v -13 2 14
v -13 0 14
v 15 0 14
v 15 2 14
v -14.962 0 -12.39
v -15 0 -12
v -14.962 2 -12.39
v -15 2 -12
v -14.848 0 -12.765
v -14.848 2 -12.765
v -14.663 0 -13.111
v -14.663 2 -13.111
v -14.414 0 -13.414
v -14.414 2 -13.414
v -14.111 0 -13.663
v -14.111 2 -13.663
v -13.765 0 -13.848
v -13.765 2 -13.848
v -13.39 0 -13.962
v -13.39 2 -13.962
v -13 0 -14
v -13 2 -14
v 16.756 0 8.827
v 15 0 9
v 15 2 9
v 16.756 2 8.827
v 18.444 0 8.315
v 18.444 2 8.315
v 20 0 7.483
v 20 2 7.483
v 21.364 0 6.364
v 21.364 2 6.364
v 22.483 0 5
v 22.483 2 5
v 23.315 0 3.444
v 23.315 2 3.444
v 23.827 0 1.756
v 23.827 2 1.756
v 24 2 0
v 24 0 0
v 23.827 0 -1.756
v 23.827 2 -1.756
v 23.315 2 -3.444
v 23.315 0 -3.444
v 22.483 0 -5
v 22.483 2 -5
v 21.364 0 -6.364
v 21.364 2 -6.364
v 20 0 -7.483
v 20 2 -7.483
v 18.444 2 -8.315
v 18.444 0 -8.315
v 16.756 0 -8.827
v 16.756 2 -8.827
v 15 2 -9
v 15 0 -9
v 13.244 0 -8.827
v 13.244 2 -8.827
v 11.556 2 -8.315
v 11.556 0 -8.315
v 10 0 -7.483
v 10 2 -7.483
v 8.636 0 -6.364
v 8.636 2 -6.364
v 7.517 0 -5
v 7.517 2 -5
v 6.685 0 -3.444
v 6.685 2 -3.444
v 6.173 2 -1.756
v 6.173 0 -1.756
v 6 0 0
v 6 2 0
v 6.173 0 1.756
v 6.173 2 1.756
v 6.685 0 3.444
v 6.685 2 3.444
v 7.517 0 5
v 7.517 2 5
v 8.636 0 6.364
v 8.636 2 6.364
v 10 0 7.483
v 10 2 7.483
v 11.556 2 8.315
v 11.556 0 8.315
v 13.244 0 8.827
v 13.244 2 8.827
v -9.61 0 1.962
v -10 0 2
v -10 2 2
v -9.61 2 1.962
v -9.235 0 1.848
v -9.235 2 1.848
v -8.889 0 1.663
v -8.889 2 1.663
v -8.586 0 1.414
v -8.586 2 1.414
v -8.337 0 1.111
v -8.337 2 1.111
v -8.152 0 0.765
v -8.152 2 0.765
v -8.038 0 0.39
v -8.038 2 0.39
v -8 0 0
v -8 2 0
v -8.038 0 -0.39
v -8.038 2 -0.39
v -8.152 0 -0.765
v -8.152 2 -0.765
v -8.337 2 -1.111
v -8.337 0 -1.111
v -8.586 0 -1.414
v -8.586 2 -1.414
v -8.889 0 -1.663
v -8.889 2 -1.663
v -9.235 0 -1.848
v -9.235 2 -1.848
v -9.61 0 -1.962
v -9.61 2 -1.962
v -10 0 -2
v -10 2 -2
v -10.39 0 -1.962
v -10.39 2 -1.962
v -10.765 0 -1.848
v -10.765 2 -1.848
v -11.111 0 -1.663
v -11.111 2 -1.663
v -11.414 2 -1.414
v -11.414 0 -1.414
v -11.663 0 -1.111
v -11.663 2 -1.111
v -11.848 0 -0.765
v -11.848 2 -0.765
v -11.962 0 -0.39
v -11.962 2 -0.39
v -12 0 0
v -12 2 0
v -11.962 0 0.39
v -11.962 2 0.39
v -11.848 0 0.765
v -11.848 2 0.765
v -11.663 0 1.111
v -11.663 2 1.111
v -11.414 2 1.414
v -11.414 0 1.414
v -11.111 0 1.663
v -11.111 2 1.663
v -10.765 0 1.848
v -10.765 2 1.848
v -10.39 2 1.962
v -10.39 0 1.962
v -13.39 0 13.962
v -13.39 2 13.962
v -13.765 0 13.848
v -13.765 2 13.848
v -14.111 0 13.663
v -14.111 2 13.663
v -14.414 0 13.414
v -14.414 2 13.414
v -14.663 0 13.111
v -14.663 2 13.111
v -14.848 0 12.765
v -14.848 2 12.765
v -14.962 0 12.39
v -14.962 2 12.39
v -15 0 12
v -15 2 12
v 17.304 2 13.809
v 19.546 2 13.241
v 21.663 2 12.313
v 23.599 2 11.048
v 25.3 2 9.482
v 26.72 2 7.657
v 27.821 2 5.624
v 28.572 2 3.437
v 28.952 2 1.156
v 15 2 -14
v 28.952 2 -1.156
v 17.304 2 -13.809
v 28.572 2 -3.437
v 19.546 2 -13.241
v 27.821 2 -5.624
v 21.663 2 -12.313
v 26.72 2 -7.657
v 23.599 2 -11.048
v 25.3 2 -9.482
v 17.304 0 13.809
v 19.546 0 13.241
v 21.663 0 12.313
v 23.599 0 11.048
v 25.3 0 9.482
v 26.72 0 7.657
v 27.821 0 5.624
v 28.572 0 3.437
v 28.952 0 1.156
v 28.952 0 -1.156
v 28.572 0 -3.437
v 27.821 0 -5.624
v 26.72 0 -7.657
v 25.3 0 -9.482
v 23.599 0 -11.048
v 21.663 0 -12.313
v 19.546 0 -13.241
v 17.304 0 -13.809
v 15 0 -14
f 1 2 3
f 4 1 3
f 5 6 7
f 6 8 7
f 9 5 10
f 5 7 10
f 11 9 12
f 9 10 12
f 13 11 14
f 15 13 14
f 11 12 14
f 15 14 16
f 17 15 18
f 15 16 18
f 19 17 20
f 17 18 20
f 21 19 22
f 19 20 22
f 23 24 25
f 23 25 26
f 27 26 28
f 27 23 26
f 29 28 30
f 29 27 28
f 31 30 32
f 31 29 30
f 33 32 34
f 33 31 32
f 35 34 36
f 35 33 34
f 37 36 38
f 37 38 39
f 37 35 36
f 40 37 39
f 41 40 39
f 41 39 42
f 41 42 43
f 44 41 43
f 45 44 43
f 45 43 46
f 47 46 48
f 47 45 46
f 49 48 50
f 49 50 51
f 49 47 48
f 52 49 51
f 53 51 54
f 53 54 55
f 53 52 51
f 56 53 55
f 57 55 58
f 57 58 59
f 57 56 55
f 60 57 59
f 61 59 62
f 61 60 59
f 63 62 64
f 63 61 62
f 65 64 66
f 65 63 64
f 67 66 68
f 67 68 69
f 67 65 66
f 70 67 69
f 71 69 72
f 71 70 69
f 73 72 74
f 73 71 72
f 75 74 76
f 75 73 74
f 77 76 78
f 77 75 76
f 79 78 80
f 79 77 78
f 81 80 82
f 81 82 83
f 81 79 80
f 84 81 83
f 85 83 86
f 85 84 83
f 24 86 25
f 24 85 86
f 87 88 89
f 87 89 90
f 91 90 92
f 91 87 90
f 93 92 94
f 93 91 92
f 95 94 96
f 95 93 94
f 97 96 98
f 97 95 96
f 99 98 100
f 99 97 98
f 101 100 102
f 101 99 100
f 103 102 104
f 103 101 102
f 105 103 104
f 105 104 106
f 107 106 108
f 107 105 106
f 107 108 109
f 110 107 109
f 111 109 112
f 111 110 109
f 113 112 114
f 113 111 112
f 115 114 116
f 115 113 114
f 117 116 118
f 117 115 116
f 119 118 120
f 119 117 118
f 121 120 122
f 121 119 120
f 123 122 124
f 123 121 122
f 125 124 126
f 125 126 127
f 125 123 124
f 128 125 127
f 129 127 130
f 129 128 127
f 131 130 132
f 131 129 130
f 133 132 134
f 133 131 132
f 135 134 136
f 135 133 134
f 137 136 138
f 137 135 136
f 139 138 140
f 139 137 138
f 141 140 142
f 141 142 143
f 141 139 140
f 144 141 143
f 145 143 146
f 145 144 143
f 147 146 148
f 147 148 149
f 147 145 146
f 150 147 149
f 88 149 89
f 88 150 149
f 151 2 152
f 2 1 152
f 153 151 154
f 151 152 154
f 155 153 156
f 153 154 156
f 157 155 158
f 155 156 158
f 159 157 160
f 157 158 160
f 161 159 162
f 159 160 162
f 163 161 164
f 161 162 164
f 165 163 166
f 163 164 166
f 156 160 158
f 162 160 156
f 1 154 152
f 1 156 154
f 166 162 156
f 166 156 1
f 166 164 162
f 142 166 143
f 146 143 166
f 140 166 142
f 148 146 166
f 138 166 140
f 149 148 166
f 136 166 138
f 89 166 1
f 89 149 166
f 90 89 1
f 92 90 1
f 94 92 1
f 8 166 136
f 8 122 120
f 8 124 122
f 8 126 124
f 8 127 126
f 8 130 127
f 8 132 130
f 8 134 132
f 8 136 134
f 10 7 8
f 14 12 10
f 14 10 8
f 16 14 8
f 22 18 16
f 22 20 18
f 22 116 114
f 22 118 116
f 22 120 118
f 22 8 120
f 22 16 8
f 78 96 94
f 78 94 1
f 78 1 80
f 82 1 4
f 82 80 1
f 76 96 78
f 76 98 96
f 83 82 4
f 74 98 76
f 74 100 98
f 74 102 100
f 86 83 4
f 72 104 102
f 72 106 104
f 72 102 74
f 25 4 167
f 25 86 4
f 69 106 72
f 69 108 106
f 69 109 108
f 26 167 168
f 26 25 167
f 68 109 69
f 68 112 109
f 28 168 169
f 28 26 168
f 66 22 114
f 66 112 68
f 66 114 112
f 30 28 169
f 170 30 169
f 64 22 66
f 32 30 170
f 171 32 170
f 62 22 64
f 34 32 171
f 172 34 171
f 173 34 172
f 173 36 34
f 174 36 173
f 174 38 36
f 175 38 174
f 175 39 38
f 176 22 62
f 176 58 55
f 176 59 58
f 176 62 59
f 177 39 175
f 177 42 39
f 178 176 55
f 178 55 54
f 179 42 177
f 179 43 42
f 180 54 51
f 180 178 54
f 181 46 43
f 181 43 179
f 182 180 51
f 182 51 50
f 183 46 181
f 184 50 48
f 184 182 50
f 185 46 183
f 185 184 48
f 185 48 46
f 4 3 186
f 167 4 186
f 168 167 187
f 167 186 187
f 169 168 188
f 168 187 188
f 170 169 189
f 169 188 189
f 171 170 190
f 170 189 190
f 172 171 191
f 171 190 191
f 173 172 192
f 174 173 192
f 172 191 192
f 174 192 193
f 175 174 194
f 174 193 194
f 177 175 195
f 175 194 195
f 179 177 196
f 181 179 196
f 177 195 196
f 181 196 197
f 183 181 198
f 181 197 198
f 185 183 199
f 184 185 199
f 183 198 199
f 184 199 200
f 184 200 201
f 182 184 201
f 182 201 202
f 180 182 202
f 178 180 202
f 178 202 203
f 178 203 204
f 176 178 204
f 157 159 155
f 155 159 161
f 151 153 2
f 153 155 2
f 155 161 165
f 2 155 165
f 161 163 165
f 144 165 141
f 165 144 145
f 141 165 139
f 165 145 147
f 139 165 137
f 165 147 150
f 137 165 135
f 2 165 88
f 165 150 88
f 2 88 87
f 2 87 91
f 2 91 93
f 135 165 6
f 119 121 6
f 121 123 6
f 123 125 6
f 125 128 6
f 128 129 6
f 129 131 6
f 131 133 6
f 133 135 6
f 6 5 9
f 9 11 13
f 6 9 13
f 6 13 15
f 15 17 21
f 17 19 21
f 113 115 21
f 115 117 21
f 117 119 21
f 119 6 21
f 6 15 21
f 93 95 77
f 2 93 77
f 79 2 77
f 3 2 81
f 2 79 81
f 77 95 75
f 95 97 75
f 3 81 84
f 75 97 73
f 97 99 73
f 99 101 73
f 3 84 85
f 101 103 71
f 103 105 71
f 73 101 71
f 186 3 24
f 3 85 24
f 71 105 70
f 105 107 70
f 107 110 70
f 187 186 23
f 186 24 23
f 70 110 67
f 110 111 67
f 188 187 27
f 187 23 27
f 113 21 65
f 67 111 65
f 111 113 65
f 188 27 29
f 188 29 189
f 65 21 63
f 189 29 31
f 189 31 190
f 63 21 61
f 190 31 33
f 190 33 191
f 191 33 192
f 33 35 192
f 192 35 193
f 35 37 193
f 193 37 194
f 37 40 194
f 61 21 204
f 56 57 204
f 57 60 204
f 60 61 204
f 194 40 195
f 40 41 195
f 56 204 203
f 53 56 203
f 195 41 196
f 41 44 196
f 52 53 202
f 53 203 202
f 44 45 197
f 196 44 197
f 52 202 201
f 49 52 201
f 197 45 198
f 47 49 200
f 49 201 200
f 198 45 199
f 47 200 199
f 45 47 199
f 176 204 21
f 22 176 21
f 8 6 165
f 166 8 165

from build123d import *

# Parameters (mm, degrees)
SKETCH1_R           = 2
SKETCH1_R_2         = 9
BOSS_EXTRUDE1_DEPTH = 2
FILLET1_R           = 2


with BuildPart() as part:
    # Sketch1 → Boss-Extrude1 (new body)
    with BuildSketch(Plane(origin=(0, 0, 0), x_dir=(1, 0, 0), z_dir=(0, 1, 0))):
        with BuildLine():
            Line((-15, -14), (15, -14))
            ThreePointArc((15, -14), (29, 0), (15, 14))
            Line((15, 14), (-15, 14))
            Line((-15, 14), (-15, -14))
        make_face()
        with Locations(Location((-10, 0, 0), (0, 0, 270))):
            Circle(SKETCH1_R, mode=Mode.SUBTRACT)
        with Locations(Location((15, 0, 0), (0, 0, 270))):
            Circle(SKETCH1_R_2, mode=Mode.SUBTRACT)
    extrude(amount=BOSS_EXTRUDE1_DEPTH)

    # Fillet1
    fillet1_edges = [part.edges().sort_by_distance(p)[0] for p in [
        (-15, 1, 14),
        (-15, 1, -14),
    ]]
    fillet(fillet1_edges, radius=FILLET1_R)


solid = part.part
